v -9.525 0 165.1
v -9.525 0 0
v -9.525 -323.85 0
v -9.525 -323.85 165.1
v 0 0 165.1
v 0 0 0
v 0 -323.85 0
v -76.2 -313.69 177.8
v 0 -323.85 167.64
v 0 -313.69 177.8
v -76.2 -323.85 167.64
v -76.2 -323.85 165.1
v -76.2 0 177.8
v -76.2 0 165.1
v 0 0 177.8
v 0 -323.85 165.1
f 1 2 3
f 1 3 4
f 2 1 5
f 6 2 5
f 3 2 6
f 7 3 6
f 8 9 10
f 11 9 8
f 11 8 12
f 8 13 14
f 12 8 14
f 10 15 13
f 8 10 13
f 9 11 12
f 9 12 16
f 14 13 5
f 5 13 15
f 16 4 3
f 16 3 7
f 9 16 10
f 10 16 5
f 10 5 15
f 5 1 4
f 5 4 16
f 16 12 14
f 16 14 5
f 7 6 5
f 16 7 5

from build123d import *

# Parameters (mm, degrees)
F0_W     = 9.525
F0_H     = 165.1
F1_DEPTH = 323.85
F2_DEPTH = 323.85
F3_SIZE  = 10.16


with BuildPart() as f1:
    # F0 (on Front) → F1 (new body)
    with BuildSketch(Plane.XZ):
        with Locations((-4.7625, 82.55)):
            Rectangle(F0_W, F0_H)
    extrude(amount=F1_DEPTH)


with BuildPart() as f2:
    # F0 (on Front) → F2 (new body, through all)
    with BuildSketch(Plane.XZ):
        Polygon((-76.2, 165.1), (-9.525, 165.1), (0, 165.1), (0, 177.8), (-76.2, 177.8), align=None)
    extrude(amount=F2_DEPTH)

    # F3
    f3_edges = [f2.edges().sort_by_distance(p)[0] for p in [
        (-38.1, -323.85, 177.8),
    ]]
    chamfer(f3_edges, length=F3_SIZE)


solid = Compound([f1.part, f2.part])
